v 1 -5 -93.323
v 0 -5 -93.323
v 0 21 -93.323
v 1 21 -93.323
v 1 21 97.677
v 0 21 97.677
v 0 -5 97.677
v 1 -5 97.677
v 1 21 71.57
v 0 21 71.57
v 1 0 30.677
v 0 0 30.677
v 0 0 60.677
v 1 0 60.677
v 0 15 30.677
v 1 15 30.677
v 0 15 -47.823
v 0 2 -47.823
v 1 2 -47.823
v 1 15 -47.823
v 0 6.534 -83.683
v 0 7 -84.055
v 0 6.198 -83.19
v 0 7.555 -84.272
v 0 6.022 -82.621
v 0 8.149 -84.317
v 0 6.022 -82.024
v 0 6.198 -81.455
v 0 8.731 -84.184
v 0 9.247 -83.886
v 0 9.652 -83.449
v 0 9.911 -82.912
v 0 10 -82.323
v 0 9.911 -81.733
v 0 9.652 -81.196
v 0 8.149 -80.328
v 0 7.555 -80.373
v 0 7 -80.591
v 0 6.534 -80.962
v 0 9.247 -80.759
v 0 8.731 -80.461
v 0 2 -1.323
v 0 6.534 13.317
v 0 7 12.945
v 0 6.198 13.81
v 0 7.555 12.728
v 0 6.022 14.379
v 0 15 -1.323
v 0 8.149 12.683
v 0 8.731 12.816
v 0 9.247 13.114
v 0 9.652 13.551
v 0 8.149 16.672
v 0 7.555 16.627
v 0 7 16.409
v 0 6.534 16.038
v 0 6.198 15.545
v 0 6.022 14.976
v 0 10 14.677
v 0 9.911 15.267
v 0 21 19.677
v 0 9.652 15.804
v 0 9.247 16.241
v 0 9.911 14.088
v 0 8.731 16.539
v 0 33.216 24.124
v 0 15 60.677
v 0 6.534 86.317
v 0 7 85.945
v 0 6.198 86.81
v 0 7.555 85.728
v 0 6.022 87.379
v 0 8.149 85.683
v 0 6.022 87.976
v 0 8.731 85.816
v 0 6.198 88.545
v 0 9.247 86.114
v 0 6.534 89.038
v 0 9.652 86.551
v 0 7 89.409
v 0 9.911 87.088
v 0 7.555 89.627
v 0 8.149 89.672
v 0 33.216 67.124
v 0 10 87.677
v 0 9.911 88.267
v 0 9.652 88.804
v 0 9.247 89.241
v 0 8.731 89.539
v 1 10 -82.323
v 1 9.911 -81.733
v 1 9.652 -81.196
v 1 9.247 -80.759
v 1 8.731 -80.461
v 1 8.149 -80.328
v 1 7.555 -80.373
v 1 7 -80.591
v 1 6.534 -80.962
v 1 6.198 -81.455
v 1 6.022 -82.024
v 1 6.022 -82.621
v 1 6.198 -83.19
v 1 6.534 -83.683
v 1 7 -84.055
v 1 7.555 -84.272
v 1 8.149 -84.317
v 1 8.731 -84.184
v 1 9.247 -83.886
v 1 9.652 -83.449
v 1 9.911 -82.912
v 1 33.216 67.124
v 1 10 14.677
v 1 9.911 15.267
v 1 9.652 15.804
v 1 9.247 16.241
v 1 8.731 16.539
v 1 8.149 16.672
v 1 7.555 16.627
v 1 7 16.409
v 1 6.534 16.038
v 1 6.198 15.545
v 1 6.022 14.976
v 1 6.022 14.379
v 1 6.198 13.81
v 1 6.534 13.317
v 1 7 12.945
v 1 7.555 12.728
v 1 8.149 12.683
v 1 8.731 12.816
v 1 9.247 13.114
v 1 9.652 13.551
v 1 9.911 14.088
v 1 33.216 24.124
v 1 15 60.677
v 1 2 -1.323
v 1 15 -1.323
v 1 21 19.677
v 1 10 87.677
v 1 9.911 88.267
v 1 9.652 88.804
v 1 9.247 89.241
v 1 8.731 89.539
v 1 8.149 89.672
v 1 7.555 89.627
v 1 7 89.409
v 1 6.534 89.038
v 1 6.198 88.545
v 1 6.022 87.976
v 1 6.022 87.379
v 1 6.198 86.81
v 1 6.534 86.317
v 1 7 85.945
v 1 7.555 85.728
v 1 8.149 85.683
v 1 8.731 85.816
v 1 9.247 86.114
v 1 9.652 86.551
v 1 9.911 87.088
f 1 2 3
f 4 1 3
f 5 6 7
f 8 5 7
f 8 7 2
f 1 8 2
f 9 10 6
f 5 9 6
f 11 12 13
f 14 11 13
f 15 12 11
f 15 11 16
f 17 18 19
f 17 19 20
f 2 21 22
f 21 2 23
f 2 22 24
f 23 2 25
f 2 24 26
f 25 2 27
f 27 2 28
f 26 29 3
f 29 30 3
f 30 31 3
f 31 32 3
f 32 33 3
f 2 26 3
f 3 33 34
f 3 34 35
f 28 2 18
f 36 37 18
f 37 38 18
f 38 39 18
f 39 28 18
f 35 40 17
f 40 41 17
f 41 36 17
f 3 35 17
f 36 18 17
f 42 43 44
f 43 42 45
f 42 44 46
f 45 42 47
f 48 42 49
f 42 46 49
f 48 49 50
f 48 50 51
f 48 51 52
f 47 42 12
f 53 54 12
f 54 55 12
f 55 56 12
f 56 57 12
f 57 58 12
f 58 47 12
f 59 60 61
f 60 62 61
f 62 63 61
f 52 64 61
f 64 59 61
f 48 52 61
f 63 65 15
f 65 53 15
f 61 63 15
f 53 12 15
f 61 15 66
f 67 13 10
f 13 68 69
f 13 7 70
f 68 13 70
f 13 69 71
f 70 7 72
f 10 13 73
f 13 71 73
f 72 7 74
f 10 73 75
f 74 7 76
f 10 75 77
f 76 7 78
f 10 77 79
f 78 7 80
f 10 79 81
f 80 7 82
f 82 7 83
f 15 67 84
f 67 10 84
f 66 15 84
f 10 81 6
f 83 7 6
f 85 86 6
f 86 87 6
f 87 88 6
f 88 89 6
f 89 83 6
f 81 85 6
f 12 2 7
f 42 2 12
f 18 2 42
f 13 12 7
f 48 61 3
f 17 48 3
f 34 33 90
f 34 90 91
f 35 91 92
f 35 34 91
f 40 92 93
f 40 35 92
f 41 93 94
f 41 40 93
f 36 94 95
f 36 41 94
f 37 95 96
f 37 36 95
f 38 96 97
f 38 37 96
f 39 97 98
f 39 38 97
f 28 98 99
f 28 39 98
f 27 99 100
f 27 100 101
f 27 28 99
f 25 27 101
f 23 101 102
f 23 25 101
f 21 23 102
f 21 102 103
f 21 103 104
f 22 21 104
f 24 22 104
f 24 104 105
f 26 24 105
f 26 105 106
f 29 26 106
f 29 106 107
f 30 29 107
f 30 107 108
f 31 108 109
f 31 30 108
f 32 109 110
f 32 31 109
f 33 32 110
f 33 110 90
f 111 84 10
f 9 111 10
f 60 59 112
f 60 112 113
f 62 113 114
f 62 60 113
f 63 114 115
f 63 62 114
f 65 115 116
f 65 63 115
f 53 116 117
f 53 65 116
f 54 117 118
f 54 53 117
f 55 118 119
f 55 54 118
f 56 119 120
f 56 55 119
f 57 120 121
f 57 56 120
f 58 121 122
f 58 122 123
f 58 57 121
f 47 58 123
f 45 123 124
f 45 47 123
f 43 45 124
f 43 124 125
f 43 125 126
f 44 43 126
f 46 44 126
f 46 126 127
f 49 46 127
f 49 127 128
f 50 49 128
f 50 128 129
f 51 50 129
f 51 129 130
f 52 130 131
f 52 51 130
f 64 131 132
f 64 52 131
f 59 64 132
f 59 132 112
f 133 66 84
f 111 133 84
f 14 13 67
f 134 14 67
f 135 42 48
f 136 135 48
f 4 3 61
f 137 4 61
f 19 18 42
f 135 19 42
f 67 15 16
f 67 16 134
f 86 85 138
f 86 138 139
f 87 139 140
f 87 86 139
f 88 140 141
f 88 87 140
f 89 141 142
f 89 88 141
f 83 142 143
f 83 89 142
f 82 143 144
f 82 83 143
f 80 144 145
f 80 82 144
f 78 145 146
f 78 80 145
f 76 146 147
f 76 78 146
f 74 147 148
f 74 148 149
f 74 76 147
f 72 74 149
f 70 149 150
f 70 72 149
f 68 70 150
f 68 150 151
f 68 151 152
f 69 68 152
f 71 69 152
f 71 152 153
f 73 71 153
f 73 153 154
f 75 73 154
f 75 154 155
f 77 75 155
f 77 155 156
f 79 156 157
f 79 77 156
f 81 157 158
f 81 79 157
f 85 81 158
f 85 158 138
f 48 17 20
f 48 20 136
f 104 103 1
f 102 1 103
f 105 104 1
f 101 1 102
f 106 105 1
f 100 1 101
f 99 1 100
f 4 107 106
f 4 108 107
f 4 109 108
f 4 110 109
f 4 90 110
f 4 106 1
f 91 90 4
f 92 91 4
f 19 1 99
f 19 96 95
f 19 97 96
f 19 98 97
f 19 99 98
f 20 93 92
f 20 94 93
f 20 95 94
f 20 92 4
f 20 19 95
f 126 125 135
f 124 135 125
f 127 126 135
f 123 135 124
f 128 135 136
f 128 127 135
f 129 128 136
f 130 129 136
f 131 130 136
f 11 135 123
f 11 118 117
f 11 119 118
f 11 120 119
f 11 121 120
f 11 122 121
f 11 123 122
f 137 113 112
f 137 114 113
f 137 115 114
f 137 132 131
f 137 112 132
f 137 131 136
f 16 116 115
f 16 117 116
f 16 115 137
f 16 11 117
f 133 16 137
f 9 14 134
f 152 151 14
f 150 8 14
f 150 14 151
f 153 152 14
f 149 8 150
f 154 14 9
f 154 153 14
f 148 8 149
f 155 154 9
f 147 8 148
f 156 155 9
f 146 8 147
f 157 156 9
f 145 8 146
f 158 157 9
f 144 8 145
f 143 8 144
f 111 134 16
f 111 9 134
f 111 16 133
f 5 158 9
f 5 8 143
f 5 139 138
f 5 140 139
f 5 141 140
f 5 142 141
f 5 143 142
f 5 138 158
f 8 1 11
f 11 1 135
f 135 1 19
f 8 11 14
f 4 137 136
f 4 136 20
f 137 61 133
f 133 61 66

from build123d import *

# Parameters (mm, degrees)
F0_R     = 2
F0_W     = 13
F0_H     = 46.5
F0_W_2   = 15
F0_H_2   = 30
F1_DEPTH = 1


with BuildPart() as f1:
    # F0 (on Right) → F1 (new body)
    with BuildSketch(Plane.YZ):
        Polygon((21, 97.677421), (-5, 97.677421), (-5, -93.322579), (21, -93.322579), (21, 19.677421), (33.216004, 24.123683), (33.216004, 67.123683), (21, 71.569945), align=None)
        with Locations((8, -82.322579)):
            Circle(F0_R, mode=Mode.SUBTRACT)
        with Locations((8.5, -24.572579)):
            Rectangle(F0_W, F0_H, mode=Mode.SUBTRACT)
        with Locations((8, 14.677421)):
            Circle(F0_R, mode=Mode.SUBTRACT)
        with Locations((7.5, 45.677421)):
            Rectangle(F0_W_2, F0_H_2, mode=Mode.SUBTRACT)
        with Locations((8, 87.677421)):
            Circle(F0_R, mode=Mode.SUBTRACT)
    extrude(amount=F1_DEPTH)


solid = f1.part
